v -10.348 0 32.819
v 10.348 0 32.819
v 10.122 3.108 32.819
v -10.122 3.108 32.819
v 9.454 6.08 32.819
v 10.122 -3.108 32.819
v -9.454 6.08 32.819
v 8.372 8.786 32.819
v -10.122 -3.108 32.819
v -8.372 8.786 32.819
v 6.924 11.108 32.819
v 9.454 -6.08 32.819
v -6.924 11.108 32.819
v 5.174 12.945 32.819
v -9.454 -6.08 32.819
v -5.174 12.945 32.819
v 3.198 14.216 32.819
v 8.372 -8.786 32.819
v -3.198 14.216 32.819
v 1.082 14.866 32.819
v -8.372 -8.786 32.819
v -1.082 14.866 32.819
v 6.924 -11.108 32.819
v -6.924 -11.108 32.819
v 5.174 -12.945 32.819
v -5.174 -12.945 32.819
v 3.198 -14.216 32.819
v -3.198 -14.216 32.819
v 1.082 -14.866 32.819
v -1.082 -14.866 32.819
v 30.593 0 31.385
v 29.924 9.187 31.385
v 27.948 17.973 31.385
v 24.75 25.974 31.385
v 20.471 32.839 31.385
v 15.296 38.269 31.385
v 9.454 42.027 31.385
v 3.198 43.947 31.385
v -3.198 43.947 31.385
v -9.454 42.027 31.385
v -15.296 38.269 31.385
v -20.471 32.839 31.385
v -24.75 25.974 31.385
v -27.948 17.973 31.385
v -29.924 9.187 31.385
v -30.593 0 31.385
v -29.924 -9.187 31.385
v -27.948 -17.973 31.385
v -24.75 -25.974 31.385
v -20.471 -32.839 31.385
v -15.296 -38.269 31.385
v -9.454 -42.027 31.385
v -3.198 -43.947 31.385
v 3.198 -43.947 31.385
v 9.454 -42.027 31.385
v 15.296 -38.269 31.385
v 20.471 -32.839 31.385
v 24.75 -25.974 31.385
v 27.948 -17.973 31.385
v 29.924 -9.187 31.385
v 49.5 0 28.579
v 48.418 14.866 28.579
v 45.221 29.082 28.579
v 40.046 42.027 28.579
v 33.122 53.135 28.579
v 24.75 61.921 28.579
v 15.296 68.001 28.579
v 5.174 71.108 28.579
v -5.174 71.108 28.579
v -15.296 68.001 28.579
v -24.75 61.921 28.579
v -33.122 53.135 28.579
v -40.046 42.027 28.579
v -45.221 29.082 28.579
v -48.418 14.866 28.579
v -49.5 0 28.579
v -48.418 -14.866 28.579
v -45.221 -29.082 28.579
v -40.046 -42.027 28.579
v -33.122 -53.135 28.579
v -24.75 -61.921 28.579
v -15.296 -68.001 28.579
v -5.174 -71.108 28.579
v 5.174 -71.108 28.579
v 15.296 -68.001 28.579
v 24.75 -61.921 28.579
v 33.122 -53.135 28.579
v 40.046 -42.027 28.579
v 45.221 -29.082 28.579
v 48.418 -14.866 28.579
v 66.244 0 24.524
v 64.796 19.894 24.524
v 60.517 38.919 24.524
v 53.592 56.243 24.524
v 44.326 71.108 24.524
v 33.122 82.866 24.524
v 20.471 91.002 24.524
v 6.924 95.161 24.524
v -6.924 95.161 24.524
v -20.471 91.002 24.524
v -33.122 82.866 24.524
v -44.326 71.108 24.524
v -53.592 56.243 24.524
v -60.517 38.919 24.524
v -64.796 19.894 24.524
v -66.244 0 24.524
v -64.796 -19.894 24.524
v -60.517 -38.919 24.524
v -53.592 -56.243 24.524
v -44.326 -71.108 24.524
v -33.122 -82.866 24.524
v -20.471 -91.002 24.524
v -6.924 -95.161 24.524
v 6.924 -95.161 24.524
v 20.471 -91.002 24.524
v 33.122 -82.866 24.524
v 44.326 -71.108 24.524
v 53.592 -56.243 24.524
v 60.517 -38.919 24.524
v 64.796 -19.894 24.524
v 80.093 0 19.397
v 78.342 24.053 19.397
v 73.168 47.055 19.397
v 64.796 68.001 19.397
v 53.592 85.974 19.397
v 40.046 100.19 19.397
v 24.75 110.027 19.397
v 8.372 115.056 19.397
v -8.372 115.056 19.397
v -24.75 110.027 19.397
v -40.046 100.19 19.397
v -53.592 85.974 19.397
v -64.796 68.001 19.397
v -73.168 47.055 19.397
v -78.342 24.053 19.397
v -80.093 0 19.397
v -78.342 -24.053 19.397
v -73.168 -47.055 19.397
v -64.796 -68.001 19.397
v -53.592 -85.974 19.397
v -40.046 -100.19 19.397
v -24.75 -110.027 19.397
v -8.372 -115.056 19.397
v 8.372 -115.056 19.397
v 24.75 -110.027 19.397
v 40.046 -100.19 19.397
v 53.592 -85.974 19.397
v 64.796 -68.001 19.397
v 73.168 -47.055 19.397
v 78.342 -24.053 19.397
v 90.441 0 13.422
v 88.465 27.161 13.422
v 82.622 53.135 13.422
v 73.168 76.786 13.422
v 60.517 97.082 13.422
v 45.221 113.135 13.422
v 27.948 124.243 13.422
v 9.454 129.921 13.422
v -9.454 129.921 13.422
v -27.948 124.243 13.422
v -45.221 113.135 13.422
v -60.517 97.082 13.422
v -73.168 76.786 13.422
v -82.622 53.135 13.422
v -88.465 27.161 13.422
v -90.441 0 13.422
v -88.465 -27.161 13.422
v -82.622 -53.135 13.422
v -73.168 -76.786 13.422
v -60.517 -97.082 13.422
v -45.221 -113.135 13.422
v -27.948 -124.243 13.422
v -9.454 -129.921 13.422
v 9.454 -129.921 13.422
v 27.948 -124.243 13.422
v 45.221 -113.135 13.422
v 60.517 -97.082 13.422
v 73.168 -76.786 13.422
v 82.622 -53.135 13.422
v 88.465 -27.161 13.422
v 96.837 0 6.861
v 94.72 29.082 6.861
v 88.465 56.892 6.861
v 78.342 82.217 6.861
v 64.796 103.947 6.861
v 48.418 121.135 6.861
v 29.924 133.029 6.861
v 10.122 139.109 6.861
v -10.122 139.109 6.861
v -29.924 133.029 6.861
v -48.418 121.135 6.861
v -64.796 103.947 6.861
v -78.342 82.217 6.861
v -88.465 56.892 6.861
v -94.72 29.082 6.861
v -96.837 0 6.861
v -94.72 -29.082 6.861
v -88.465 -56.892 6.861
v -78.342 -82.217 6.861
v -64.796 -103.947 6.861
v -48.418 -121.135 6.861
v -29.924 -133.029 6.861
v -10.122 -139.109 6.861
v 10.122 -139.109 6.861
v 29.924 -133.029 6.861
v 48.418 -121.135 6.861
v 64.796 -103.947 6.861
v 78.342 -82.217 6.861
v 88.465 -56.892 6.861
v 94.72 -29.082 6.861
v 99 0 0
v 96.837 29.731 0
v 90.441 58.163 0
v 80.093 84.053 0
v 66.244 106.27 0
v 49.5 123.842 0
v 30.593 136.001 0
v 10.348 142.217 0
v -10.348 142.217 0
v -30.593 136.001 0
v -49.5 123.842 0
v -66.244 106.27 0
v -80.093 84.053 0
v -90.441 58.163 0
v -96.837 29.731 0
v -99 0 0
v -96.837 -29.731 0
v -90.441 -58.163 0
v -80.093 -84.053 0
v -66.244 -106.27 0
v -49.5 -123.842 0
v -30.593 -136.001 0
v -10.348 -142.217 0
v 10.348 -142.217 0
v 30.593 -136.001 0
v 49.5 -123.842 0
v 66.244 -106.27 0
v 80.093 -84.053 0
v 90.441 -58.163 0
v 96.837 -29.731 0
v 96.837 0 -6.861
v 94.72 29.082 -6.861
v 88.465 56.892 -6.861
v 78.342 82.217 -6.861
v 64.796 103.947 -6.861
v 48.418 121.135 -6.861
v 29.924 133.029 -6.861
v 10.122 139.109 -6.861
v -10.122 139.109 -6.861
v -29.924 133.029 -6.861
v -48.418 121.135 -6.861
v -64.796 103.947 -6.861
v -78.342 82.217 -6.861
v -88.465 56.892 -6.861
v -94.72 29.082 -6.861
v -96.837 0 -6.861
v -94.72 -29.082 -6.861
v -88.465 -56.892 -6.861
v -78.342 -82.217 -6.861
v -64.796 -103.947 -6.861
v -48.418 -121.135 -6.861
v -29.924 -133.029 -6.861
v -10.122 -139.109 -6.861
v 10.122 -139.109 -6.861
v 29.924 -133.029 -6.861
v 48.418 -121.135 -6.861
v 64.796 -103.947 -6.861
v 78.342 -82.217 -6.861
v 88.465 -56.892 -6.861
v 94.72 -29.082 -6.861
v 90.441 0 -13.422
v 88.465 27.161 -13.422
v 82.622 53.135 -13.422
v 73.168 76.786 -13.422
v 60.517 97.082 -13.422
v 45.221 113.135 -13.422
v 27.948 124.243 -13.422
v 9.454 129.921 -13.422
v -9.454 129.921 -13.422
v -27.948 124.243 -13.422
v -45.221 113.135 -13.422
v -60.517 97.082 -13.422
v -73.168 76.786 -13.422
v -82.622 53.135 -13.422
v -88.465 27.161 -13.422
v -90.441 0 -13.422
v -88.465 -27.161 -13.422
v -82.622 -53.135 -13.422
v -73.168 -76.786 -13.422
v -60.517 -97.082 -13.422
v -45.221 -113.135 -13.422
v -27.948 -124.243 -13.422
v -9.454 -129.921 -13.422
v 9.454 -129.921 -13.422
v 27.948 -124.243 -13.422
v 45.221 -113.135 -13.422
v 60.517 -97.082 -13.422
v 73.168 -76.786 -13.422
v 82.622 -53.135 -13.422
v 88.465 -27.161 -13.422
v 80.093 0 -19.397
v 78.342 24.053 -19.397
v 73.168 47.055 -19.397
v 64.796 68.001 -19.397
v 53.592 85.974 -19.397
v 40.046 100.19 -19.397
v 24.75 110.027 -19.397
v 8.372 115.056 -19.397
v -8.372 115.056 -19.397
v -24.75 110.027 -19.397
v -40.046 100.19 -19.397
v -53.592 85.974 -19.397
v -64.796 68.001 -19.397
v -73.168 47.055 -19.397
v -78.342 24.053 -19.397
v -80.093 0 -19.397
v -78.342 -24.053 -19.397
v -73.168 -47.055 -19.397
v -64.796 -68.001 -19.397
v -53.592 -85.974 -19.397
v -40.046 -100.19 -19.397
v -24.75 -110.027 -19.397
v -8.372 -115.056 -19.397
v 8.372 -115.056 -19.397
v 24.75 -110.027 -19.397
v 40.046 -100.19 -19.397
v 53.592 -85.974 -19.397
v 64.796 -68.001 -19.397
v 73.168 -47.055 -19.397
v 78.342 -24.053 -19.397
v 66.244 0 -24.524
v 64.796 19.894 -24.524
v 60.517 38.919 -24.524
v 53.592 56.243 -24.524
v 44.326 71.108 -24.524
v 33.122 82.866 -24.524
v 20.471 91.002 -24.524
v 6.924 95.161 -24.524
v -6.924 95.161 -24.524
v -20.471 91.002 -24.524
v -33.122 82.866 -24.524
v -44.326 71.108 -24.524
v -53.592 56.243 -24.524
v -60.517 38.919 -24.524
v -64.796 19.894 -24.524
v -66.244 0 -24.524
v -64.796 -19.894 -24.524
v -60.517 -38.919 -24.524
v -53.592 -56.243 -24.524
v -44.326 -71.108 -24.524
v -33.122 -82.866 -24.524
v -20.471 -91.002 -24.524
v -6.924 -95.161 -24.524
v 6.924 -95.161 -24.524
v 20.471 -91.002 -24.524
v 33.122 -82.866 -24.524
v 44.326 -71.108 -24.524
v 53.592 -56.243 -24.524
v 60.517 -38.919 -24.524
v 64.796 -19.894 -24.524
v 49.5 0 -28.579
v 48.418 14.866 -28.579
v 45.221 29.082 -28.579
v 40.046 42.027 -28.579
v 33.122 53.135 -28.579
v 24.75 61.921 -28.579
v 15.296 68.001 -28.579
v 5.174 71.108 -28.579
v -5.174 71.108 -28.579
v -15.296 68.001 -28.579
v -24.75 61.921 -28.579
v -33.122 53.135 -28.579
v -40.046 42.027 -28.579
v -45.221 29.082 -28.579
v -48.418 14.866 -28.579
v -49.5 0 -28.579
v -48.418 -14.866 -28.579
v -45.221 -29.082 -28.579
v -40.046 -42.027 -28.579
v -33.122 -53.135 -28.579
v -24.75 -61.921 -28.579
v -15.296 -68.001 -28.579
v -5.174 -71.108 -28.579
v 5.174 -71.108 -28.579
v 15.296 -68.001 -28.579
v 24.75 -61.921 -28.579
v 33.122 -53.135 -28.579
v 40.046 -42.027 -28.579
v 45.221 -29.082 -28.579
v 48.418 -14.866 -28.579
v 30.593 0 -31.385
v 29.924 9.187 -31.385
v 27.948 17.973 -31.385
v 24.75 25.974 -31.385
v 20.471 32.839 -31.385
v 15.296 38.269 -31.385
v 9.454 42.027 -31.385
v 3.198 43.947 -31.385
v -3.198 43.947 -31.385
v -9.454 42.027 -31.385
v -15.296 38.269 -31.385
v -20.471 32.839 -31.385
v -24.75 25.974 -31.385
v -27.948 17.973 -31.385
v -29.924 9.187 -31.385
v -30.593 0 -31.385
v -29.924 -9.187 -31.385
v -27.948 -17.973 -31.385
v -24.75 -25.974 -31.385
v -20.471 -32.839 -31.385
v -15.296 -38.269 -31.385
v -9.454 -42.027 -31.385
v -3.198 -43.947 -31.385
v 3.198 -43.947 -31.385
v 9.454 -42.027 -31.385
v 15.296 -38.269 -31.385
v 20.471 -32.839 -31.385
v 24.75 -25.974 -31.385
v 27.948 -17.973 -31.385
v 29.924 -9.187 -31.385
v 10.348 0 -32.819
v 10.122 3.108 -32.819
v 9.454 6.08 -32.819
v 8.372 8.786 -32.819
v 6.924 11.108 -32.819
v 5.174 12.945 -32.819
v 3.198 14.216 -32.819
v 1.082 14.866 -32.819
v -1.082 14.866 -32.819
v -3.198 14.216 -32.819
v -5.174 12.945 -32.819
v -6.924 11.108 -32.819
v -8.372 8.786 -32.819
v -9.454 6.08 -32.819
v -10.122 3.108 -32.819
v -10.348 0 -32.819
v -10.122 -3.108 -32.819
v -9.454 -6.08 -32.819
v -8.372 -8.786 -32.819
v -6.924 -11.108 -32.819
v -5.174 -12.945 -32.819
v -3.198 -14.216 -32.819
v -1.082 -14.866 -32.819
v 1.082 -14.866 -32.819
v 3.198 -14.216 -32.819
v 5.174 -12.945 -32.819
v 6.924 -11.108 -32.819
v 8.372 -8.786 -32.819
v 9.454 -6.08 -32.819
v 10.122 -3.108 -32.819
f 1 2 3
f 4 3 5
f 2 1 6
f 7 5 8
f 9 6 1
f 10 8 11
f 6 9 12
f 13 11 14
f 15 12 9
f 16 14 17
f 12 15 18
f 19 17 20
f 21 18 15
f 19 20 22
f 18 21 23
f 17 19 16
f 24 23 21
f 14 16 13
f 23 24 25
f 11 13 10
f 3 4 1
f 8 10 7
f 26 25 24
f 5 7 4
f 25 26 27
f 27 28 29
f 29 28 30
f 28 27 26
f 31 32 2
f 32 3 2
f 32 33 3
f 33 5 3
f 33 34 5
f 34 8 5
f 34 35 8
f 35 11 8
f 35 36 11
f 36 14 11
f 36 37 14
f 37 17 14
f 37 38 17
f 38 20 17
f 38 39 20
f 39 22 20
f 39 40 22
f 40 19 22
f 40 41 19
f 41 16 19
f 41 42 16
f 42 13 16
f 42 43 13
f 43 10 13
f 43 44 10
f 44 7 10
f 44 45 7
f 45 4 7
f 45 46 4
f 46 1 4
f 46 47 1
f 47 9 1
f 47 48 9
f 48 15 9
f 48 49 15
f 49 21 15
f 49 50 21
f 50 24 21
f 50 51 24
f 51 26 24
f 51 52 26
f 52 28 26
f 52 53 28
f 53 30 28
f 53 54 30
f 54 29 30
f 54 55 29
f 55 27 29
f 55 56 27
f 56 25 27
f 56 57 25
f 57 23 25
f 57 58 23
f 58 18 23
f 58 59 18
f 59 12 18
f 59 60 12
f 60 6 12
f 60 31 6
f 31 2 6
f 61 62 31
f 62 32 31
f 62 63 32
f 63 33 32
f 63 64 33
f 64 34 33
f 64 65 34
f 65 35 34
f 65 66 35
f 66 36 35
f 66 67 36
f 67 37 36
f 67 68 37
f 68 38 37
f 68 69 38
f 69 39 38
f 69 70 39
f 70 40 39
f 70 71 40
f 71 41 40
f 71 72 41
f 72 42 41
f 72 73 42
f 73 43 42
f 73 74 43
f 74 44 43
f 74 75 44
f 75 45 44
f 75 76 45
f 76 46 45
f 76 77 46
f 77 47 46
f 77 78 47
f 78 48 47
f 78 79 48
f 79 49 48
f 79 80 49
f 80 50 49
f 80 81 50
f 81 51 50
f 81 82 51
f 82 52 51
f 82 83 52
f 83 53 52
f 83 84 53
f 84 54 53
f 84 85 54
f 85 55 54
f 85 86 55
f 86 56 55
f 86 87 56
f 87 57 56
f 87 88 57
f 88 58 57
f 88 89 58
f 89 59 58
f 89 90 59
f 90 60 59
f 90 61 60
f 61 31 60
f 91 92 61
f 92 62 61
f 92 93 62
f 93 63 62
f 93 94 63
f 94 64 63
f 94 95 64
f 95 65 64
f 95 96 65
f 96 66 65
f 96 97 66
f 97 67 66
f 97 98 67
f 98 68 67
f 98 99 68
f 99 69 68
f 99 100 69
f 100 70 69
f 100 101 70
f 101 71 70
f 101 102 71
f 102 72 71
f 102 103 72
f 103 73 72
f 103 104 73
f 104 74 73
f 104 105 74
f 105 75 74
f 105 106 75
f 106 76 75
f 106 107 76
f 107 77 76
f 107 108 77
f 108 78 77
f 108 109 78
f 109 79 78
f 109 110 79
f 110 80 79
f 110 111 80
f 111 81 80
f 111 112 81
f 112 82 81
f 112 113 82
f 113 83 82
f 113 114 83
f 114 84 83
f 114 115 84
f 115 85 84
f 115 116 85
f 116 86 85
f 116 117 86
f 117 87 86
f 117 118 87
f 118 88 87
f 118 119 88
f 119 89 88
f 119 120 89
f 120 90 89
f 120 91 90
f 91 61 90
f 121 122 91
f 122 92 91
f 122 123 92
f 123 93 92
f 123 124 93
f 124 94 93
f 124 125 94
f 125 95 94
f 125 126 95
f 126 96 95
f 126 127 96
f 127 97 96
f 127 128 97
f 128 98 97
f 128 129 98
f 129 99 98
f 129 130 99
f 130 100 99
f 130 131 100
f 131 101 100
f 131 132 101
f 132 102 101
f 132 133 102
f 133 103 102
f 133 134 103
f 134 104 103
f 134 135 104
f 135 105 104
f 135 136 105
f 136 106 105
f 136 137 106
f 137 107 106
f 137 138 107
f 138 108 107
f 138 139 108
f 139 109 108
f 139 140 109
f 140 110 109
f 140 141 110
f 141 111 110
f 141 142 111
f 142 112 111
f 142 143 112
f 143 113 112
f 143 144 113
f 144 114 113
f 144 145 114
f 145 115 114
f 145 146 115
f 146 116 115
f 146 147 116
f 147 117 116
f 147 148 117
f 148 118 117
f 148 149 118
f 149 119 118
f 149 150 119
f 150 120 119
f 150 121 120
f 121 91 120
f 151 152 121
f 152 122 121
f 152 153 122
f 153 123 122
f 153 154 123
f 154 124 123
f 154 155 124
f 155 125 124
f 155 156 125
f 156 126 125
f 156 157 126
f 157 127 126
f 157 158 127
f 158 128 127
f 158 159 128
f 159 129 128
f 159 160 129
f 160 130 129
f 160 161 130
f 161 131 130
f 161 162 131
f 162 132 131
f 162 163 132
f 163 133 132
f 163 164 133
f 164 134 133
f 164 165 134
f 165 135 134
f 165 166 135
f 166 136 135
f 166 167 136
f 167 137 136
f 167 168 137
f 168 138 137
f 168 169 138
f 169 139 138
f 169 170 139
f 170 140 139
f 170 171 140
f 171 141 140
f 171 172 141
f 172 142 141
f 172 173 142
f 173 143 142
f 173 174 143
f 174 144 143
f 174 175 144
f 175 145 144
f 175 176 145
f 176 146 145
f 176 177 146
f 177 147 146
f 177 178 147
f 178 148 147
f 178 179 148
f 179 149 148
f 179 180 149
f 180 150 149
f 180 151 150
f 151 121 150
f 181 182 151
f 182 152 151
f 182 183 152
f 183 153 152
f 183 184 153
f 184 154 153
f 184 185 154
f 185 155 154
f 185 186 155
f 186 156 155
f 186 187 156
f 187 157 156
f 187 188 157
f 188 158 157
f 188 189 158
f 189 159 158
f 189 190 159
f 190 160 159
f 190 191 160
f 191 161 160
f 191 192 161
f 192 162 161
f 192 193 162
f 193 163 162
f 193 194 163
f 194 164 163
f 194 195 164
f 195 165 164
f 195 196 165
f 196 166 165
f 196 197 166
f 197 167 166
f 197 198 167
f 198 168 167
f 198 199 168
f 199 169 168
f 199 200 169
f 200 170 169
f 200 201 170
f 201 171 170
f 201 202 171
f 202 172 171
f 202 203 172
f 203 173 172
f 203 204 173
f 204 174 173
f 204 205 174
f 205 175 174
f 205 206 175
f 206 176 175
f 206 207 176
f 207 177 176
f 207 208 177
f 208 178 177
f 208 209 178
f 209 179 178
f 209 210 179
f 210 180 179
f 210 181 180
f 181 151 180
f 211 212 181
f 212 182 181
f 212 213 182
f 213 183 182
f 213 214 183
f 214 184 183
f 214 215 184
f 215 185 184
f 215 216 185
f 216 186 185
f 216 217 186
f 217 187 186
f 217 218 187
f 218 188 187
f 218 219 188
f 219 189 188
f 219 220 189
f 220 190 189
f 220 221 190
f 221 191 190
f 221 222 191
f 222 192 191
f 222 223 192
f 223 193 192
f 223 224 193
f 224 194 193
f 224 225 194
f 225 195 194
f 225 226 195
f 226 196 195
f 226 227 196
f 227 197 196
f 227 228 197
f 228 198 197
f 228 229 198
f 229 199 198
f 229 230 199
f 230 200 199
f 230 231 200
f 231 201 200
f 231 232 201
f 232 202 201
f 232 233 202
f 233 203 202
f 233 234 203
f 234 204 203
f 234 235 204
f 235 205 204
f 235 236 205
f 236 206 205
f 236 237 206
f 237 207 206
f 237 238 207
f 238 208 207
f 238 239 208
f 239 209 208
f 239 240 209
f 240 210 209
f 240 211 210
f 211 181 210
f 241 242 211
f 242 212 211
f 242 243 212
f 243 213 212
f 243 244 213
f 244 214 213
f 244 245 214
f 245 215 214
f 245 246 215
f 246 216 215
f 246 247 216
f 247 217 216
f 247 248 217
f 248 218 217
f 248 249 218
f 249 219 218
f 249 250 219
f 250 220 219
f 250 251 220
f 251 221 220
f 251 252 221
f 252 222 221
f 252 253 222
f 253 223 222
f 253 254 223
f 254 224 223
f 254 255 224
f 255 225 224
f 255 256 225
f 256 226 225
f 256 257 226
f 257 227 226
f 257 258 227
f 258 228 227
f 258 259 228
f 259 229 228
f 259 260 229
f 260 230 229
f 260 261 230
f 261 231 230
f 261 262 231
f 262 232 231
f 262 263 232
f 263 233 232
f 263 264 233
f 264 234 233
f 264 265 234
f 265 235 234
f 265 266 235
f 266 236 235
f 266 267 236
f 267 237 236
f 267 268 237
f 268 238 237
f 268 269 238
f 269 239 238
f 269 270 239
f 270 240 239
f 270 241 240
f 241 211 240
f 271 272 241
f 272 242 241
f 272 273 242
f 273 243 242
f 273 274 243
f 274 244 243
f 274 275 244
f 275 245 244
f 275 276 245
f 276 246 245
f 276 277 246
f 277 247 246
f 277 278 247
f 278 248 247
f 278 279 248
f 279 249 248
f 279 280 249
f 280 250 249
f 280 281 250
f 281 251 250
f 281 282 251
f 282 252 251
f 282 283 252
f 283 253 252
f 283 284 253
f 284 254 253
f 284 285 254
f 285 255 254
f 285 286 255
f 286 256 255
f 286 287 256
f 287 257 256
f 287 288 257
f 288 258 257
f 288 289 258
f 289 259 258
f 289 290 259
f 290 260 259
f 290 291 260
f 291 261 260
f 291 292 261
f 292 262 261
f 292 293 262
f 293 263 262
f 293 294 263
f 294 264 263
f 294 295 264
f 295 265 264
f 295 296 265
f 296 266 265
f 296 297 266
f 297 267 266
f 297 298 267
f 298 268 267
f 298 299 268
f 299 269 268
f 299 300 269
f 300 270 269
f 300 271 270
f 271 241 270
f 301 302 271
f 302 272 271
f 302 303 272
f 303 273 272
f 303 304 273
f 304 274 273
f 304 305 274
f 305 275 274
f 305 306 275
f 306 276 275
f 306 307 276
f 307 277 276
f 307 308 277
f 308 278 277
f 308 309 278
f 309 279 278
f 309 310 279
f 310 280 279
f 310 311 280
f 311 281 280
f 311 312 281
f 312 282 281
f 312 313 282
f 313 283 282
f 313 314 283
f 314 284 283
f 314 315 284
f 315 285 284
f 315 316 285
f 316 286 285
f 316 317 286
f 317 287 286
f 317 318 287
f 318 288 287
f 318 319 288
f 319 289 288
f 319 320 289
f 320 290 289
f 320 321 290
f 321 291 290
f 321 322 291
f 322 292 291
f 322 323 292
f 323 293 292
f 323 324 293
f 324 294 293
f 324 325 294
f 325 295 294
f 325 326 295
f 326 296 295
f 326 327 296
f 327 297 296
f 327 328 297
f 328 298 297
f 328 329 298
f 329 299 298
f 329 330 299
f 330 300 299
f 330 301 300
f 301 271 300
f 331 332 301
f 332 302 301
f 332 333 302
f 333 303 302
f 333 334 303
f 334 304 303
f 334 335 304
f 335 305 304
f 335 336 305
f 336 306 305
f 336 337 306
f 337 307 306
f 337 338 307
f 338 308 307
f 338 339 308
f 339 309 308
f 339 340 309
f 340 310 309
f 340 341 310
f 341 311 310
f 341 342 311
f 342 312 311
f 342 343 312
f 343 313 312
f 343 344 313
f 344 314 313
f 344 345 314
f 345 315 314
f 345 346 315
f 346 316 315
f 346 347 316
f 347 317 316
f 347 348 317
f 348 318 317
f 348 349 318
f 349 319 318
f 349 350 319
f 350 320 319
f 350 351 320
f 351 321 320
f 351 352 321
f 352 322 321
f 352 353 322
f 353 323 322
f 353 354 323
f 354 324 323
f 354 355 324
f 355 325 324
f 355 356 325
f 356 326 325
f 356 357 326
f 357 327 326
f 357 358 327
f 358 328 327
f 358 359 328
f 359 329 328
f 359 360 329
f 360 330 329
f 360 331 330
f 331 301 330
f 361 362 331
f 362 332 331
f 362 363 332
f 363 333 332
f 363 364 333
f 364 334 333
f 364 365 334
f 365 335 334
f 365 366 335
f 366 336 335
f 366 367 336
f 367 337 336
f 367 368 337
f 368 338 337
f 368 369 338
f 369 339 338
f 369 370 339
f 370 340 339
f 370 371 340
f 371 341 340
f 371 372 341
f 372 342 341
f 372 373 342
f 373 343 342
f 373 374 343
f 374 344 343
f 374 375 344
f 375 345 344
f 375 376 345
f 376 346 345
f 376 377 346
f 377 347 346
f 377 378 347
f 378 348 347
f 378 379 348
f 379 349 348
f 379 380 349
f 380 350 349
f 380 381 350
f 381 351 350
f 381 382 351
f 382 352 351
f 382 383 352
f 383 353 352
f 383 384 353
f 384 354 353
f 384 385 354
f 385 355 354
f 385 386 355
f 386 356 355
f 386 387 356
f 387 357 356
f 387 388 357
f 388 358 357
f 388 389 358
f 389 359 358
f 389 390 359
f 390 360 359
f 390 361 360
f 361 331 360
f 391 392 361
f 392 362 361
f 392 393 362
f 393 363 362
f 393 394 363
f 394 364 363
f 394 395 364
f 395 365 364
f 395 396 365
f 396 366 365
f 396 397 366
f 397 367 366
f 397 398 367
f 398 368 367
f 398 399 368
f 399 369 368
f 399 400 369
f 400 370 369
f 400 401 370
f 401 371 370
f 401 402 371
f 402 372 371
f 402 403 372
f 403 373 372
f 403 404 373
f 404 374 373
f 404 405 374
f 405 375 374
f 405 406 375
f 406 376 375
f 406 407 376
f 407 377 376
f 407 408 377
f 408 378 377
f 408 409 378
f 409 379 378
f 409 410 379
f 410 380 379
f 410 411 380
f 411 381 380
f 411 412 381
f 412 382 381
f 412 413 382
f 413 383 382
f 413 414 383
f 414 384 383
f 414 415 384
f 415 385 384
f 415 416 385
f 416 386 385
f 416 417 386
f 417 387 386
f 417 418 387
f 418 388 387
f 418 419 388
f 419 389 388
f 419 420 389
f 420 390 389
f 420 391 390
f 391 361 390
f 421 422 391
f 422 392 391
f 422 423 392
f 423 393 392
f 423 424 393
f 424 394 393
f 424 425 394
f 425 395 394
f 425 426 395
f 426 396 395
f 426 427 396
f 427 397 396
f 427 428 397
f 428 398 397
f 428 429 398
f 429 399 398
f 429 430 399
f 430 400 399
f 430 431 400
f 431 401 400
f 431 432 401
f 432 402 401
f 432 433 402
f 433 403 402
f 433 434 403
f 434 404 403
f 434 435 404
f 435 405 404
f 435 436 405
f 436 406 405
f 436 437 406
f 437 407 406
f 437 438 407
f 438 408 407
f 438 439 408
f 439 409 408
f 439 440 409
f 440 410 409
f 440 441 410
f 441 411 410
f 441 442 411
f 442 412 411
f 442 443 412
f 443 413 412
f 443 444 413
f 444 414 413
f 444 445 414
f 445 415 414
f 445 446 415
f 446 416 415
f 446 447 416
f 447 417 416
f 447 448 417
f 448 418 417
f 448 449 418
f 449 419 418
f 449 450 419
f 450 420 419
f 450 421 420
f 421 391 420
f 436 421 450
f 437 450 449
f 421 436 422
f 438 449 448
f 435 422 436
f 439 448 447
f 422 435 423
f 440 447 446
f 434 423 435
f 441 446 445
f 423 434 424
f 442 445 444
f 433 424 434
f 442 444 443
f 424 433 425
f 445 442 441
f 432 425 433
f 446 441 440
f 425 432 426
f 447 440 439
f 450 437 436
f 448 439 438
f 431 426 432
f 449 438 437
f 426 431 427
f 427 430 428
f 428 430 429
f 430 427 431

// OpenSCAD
// Generated by SolidPython 1.0.1 on 2020-07-29 00:46:48


scale(v = [9, 13, 3]) {
	sphere(r = 11);
}
/***********************************************
*********      SolidPython code:      **********
************************************************
 
# import packages: SolidPython
from solid import *
from solid.utils import *
from itertools import chain, combinations, permutations


class Resize:

    def __init__(self, scad_file):
        self.scad_file = scad_file
        #self.scad_file = import_scad(scad_file)
        # cone/cylinder param:
        self.r1 = 0
        self.r2 = 0
        self.h = 0
        # rectangular prism param:
        self.w = 0
        self.l = 0
        # ellipse param:
        self.r = 0

    # import OpenScad code (file name corresponds to shape)


    # classify shape + parameters
    def assign(self, param1, param2, param3):
        if self.scad_file == 'cone.scad':
            self.r1 = param1
            self.r2 = param2
            self.h = param3
        elif self.scad_file == 'cylinder.scad':
            self.r1 = param1
            self.r2 = param2
            self.h = param3
        elif self.scad_file == 'rectangularPrism.scad':
            self.h = param1
            self.l = param2
            self.w = param3
        else:
            self.r = param1
            self.h = param2

    # resize parameters
    def iterate(self):
        x = range(3, 20, 2)
        i = 1
        if self.scad_file == 'cone.scad':
            tempList = list(permutations(x, 2))
            for temp in tempList:
                param1 = temp[0]
                param2 = temp[1]
                filepath = 'produced_scad_files/' + 'cone' + str(param1) + '_' + str(param2) + '_' + '.scad'
                scad_render_to_file(cylinder(h=param1, r1=param2, r2=0), filepath)

        elif self.scad_file == 'cylinder.scad':
            tempList = list(permutations(x, 3))
            for temp in tempList:
                param1 = temp[0]
                param2 = temp[1]
                filepath = 'produced_scad_files/' + 'cylinder' + str(param1) + '_' + str(param2) + '_' + '.scad'
                scad_render_to_file(cylinder(h=param1, r1=param2, r2=param2), filepath)

        elif self.scad_file == 'rectangularPrism.scad':
            tempList = list(permutations(x, 3))
            for temp in tempList:
                param1 = temp[0]
                param2 = temp[1]
                param3 = temp[2]
                filepath = 'produced_scad_files/' + 'rectangularPrism' + str(param1) + '_' + str(param2) + '_' + str(
                    param3) + '.scad'
                scad_render_to_file(cube(size=(param1, param2, param3)), filepath)

        elif self.scad_file == 'ellipse.scad':
            tempList = list(permutations(x, 4))
            for temp in tempList:
                param1 = temp[0]
                param2 = temp[1]
                param3 = temp[2]
                param4 = temp[3]
                filepath = 'produced_scad_files/' + 'ellipse' + str(param1) + '_' + str(param2) + '_' + str(param3) + '_' + str(param4) + '.scad'
                scad_render_to_file(scale([param1, param2, param3])(sphere(r=param4)), filepath)

    def render_to_scadfile(self):
        scad_render_to_file(scad, 'example.scad') 
 
************************************************/
